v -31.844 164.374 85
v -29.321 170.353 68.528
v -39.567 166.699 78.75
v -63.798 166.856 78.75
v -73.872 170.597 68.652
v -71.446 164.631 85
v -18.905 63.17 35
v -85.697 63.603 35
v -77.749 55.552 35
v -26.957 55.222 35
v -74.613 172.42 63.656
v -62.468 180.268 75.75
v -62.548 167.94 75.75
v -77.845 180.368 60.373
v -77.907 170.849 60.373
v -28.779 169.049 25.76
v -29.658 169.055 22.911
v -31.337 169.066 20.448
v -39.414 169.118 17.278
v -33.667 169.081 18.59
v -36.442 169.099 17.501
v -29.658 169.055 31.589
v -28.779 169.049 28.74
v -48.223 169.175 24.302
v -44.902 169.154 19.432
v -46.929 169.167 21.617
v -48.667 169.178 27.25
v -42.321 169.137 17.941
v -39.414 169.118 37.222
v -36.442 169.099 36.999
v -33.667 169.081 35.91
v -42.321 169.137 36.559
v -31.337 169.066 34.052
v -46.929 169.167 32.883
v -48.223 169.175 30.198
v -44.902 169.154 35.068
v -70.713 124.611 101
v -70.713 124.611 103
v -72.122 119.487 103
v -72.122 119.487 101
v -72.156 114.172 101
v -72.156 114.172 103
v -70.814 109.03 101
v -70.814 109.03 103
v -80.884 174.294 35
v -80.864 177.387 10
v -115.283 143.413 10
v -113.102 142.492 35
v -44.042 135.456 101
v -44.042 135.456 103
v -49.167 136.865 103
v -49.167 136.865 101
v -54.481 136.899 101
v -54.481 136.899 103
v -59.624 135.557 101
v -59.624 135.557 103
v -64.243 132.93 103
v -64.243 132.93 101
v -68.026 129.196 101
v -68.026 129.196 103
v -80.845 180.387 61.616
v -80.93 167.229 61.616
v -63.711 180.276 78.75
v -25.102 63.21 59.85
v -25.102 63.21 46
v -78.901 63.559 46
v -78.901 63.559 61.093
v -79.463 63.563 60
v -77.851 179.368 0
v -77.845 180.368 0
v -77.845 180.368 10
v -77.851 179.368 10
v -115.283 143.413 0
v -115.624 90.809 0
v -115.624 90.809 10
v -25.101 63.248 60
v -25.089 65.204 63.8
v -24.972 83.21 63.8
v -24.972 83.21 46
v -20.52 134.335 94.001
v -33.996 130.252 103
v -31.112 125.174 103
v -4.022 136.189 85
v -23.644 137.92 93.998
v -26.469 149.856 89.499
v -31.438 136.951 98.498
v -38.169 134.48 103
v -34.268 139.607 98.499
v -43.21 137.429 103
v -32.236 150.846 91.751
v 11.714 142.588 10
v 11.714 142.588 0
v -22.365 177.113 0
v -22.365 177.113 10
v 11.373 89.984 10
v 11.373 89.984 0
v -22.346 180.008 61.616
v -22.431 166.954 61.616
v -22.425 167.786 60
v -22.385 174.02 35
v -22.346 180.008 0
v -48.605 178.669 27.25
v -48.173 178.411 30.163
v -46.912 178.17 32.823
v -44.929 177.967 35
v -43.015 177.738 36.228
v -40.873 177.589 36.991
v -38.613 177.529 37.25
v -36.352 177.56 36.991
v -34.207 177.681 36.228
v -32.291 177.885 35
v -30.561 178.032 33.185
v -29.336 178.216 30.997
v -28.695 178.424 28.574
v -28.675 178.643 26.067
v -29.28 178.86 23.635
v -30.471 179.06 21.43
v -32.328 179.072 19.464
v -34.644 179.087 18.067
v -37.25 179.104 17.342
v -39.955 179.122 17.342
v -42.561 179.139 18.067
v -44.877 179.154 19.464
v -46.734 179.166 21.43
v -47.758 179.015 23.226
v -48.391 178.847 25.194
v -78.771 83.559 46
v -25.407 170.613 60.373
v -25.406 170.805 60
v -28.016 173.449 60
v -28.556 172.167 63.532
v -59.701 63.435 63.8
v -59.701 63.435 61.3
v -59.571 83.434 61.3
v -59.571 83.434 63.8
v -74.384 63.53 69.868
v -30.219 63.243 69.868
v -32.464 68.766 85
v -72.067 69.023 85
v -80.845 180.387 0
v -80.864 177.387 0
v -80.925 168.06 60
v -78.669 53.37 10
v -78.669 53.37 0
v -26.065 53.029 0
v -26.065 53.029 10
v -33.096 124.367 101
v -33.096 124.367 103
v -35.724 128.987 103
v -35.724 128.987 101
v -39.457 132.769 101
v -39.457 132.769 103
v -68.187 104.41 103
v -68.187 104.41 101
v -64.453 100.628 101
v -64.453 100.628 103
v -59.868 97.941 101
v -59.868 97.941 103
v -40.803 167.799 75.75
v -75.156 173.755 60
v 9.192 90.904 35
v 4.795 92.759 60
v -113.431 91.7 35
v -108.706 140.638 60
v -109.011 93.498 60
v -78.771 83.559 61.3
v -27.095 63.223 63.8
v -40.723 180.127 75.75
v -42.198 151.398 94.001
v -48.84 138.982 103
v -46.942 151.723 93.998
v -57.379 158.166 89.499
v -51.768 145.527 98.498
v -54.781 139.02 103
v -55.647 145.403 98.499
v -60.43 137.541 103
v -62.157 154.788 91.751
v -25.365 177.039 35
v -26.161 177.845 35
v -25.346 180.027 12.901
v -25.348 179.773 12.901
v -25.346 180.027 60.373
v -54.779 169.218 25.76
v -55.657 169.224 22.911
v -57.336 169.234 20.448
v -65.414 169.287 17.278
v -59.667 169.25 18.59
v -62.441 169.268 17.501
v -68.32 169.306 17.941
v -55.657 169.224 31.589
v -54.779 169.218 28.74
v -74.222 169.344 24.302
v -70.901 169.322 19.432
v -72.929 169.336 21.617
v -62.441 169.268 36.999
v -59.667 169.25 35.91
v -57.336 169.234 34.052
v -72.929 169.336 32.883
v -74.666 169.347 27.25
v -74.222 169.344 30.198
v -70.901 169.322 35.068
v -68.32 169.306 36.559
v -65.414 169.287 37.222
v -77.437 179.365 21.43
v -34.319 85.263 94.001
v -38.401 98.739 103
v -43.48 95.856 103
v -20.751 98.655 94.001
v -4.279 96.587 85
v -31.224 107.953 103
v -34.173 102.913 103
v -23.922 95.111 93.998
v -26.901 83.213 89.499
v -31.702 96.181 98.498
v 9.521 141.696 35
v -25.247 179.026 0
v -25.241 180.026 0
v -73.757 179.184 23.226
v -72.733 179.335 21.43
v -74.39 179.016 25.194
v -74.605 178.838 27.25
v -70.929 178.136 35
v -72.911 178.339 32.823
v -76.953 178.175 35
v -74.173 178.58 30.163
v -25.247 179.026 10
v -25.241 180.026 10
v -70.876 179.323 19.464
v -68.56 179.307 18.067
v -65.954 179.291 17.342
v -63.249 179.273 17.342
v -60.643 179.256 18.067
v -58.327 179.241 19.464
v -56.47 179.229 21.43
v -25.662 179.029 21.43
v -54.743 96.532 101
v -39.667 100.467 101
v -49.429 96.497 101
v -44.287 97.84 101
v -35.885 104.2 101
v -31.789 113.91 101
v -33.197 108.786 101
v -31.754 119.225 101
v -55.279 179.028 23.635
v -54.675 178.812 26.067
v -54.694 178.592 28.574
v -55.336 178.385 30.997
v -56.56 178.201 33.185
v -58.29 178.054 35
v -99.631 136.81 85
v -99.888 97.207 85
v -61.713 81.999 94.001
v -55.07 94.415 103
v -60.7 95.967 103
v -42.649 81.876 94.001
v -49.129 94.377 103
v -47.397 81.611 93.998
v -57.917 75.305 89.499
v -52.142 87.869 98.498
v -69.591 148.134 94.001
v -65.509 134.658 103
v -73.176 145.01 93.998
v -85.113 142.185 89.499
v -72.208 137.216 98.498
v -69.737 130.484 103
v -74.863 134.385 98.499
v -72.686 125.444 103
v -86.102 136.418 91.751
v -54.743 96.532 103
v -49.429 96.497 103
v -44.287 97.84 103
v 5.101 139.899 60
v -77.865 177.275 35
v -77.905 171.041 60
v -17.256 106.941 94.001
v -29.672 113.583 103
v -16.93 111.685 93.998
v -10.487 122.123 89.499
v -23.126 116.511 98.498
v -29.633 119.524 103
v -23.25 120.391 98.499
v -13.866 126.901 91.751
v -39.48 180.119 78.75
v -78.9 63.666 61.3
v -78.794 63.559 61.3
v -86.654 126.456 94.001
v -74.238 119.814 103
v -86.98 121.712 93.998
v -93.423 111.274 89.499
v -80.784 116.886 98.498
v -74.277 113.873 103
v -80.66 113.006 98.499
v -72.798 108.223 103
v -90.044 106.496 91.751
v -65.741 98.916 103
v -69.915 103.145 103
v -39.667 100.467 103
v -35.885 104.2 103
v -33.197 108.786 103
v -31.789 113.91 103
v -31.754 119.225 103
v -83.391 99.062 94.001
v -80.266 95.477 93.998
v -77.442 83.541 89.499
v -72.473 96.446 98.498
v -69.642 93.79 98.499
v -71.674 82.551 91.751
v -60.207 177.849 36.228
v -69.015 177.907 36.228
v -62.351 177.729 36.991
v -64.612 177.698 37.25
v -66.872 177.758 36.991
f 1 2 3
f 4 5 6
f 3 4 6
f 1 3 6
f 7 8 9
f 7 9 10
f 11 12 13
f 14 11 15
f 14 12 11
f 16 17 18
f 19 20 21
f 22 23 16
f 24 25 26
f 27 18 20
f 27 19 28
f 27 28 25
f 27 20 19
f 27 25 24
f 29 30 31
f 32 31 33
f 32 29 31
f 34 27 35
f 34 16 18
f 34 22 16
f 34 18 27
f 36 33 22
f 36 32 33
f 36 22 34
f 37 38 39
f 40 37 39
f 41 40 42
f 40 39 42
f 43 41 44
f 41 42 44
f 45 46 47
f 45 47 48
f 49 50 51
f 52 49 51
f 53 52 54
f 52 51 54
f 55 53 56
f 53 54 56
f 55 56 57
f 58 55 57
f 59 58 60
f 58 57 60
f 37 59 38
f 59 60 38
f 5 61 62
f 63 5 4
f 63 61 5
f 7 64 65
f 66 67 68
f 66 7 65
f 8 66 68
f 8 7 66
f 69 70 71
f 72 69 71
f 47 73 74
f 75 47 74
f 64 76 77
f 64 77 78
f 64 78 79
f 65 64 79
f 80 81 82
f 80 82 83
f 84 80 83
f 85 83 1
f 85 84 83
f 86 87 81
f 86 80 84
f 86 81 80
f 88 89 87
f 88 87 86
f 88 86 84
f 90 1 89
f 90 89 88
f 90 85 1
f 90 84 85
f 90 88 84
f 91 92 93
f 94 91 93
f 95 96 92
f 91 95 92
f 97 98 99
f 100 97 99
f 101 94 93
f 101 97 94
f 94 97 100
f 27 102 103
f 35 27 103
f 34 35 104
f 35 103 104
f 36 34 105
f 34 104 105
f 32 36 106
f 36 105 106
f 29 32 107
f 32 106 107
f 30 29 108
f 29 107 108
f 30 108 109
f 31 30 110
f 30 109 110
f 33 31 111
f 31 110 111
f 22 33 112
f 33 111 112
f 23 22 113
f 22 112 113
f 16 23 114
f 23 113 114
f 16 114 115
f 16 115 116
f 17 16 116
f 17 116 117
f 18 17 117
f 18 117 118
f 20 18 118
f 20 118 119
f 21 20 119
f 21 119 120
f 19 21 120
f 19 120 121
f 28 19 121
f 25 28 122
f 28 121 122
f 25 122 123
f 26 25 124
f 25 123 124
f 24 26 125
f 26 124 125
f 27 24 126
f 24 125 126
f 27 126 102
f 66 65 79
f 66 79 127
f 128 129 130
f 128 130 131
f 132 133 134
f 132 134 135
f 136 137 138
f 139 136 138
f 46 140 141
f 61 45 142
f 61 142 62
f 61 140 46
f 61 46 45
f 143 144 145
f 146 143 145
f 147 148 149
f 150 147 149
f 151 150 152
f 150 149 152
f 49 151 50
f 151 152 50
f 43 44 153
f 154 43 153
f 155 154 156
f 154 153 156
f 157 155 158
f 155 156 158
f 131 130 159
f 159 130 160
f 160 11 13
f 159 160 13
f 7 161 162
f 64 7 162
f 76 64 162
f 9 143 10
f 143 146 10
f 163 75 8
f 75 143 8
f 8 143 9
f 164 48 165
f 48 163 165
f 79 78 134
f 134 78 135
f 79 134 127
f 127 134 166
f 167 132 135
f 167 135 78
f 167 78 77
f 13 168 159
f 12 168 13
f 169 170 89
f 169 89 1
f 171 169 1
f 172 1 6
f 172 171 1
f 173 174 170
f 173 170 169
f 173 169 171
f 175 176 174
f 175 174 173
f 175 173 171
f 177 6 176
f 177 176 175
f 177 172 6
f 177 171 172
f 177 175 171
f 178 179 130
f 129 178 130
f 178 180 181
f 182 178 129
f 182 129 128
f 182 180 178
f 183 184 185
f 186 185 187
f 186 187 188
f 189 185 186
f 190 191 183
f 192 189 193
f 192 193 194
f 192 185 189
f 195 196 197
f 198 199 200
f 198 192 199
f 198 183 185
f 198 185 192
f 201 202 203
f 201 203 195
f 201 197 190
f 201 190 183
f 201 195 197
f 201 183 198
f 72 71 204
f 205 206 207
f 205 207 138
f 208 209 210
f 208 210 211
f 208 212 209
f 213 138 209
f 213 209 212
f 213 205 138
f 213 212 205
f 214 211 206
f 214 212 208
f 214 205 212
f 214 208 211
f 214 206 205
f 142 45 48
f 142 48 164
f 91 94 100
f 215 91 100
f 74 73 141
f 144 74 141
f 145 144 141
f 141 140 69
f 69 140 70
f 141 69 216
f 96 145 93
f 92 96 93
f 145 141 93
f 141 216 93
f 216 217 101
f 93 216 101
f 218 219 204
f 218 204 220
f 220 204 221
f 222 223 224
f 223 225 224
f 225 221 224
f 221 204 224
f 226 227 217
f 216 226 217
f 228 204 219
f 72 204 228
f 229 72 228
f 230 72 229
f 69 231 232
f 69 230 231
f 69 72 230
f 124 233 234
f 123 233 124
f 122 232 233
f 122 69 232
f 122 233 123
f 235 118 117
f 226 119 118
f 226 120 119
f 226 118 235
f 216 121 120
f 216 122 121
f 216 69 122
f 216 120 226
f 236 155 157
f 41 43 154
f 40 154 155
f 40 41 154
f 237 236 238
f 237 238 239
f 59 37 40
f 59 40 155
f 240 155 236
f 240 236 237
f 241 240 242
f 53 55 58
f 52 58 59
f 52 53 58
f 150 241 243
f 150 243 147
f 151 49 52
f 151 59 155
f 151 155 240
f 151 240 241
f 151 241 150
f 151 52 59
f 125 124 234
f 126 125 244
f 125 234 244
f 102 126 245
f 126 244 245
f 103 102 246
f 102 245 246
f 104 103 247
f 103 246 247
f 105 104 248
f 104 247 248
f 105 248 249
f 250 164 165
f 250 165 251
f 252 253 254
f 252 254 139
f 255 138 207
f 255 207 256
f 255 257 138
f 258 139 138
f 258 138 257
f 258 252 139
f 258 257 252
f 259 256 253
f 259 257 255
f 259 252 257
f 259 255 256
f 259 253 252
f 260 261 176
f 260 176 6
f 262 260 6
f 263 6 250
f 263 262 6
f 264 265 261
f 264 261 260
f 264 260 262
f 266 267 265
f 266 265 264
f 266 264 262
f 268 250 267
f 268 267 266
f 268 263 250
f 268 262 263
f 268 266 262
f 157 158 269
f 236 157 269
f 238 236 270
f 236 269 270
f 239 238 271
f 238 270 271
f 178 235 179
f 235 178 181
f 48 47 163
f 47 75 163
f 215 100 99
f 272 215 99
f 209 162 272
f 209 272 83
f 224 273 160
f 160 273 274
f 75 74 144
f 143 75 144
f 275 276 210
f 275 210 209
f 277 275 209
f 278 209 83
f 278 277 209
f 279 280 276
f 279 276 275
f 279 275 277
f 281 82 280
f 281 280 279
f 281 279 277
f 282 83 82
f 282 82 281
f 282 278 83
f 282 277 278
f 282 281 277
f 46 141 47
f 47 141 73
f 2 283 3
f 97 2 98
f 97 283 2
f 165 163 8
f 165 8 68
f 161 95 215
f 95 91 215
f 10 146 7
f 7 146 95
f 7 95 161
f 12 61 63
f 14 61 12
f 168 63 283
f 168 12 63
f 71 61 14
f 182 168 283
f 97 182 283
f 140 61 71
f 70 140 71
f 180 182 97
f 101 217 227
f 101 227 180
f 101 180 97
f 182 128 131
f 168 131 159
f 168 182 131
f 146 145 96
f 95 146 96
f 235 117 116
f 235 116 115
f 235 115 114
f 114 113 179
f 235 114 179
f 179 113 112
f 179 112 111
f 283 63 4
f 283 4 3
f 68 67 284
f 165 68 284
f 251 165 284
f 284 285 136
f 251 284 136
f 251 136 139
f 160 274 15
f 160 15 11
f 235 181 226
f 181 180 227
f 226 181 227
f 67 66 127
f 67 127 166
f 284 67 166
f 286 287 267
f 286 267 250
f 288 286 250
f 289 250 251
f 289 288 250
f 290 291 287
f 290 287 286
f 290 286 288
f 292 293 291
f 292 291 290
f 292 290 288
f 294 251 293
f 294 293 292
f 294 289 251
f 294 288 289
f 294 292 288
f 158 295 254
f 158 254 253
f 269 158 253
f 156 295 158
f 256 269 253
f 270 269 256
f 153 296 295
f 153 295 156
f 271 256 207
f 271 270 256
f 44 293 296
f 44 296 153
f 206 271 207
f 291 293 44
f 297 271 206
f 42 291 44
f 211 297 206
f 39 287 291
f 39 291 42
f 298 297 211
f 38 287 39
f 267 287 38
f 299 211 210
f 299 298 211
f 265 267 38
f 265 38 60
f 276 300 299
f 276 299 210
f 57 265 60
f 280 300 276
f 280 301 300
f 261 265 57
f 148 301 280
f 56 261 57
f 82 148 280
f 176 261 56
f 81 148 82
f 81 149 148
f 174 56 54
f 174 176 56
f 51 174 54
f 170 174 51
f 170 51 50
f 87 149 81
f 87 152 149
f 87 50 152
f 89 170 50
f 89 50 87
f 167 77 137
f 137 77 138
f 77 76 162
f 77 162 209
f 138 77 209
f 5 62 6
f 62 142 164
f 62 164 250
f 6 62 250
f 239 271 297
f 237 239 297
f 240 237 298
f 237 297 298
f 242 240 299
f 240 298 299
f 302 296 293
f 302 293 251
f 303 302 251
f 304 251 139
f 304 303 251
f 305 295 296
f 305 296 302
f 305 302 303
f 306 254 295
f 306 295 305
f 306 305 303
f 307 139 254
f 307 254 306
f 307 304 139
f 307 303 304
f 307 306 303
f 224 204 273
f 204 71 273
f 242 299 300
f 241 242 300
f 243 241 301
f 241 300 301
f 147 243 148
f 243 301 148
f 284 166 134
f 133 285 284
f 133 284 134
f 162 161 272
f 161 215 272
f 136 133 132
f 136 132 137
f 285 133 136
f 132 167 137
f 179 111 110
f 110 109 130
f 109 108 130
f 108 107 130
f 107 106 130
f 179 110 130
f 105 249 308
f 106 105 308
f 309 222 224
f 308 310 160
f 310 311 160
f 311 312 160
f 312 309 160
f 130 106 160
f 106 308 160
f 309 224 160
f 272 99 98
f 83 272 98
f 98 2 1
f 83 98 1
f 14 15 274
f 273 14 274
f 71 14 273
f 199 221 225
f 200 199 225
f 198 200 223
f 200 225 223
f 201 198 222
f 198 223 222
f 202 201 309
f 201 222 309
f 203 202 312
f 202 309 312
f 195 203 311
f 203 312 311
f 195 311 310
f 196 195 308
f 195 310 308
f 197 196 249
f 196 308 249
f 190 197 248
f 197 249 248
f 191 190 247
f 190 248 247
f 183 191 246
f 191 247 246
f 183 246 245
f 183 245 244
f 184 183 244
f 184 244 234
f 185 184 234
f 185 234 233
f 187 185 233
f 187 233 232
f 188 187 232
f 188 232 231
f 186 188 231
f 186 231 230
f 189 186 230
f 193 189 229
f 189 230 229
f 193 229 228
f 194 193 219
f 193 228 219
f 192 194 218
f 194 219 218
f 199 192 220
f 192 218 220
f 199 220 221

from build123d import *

# Parameters (mm, degrees)
RESSALTO_EXTRUS_O1_DEPTH  = 10
RESSALTO_EXTRUS_O2_DEPTH  = 25
RESSALTO_EXTRUS_O2_TAPER  = 5
RESSALTO_EXTRUS_O3_DEPTH  = 25
RESSALTO_EXTRUS_O3_TAPER  = 10
RESSALTO_EXTRUS_O4_DEPTH  = 25
RESSALTO_EXTRUS_O4_TAPER  = 20
ESBO_O8_R                 = 5
RESSALTO_EXTRUS_O6_DEPTH  = 18
CORTE_EXTRUS_O2_DEPTH     = 2
RESSALTO_EXTRUS_O10_DEPTH = 50
CORTE_EXTRUS_O5_START     = 35
CORTE_EXTRUS_O5_DEPTH     = 50
CORTE_EXTRUS_O6_DEPTH     = 20
CORTE_EXTRUS_O7_DEPTH     = 1
ESBO_O17_R                = 10
CORTE_EXTRUS_O8_DEPTH     = 10


with BuildPart() as part:
    # Esboço1 → Ressalto-extrusão1 (new body)
    with BuildSketch(Plane.XY):
        Polygon((11.714282715, 142.58825066), (-25.240942572, 180.026335933), (-77.844956945, 180.367769505), (-115.283042218, 143.412544218), (-115.624475789, 90.808529845), (-78.669250503, 53.370444572), (-26.06523613, 53.029011), (11.372849143, 89.984236287), align=None)
    extrude(amount=RESSALTO_EXTRUS_O1_DEPTH)

    # Esboço3 → Ressalto-extrusão2 (add)
    with BuildSketch(Plane.XY.offset(10)):
        Polygon((11.372849143, 89.984236287), (11.714282715, 142.58825066), (-25.240942572, 180.026335933), (-77.844956945, 180.367769505), (-115.283042218, 143.412544218), (-115.624475789, 90.808529845), (-78.669250503, 53.370444572), (-26.06523613, 53.029011), align=None)
    extrude(amount=RESSALTO_EXTRUS_O2_DEPTH, taper=RESSALTO_EXTRUS_O2_TAPER)

    # Esboço4 → Ressalto-extrusão3 (add)
    with BuildSketch(Plane.XY.offset(35)):
        Polygon((-26.956995692, 55.222061748), (9.191558856, 90.904388109), (9.521231967, 141.696491098), (-26.161094394, 177.845045645), (-76.953197383, 178.174718757), (-113.10175193, 142.492392396), (-113.431425042, 91.700289407), (-77.749098681, 55.55173486), align=None)
    extrude(amount=RESSALTO_EXTRUS_O3_DEPTH, taper=RESSALTO_EXTRUS_O3_TAPER)

    # Esboço5 → Ressalto-extrusão4 (add)
    with BuildSketch(Plane.XY.offset(60)):
        Polygon((-75.894600212, 59.947965354), (-28.754271643, 59.641994585), (4.795328361, 92.758886578), (5.10129913, 139.899215147), (-28.015592863, 173.448815151), (-75.155921432, 173.75478592), (-108.705521436, 140.637893927), (-109.011492205, 93.497565358), align=None)
    extrude(amount=RESSALTO_EXTRUS_O4_DEPTH, taper=RESSALTO_EXTRUS_O4_TAPER)

    # Esboço8 → Ressalto-extrusão6 (add)
    with BuildSketch(Plane.XY.offset(85)):
        with Locations((-51.955096537, 116.698390253)):
            Circle(ESBO_O8_R)
    extrude(amount=RESSALTO_EXTRUS_O6_DEPTH)

    # Esboço6 → Loft1 section 0
    with BuildSketch(Plane.XY.offset(85)):
        with BuildLine():
            Line((-99.887965086, 97.207462428), (-72.066585693, 69.022566624))
            Line((-72.066585693, 69.022566624), (-32.464168713, 68.765521704))
            Line((-32.464168713, 68.765521704), (-4.279272909, 96.586901097))
            Line((-4.279272909, 96.586901097), (-4.022227989, 136.189318077))
            Line((-4.022227989, 136.189318077), (-31.843607381, 164.374213881))
            Line((-31.843607381, 164.374213881), (-71.446024362, 164.631258801))
            Line((-71.446024362, 164.631258801), (-99.630920166, 136.809879409))
            Line((-99.630920166, 136.809879409), (-99.887965086, 97.207462428))
        make_face()
    # Esboço7 for Loft1 → Loft1 section 1
    with BuildSketch(Plane.XY.offset(103)):
        with BuildLine():
            # circular arc as an exact rational Bezier (weights 1, cos(half-angle), 1)
            Bezier((-72.797833823, 108.223114301), (-69.28725958, 99.58976984), (-60.700212313, 95.967424282), weights=[1, 0.923879532, 1])
            Bezier((-60.700212313, 95.967424282), (-52.113165047, 92.345078724), (-43.479820586, 95.855652967), weights=[1, 0.923879533, 1])
            Bezier((-43.479820586, 95.855652967), (-34.846476125, 99.36622721), (-31.224130567, 107.953274477), weights=[1, 0.923879532, 1])
            Bezier((-31.224130567, 107.953274477), (-27.601785009, 116.540321743), (-31.112359252, 125.173666204), weights=[1, 0.923879533, 1])
            Bezier((-31.112359252, 125.173666204), (-34.622933495, 133.807010665), (-43.209980762, 137.429356223), weights=[1, 0.923879532, 1])
            Bezier((-43.209980762, 137.429356223), (-51.797028028, 141.051701781), (-60.430372489, 137.541127538), weights=[1, 0.923879533, 1])
            Bezier((-60.430372489, 137.541127538), (-69.06371695, 134.030553295), (-72.686062508, 125.443506028), weights=[1, 0.923879532, 1])
            Bezier((-72.686062508, 125.443506028), (-76.308408066, 116.856458762), (-72.797833823, 108.223114301), weights=[1, 0.923879533, 1])
        make_face()
    loft()

    # Esboço9 → Corte-extrusão2 (cut)
    with BuildSketch(Plane.XY.offset(103)):
        with BuildLine():
            ThreePointArc((-44.042402012, 135.456037969), (-51.822961029, 137.056254156), (-59.62363648, 135.557170109))
            ThreePointArc((-59.62363648, 135.557170109), (-66.25684624, 131.187007783), (-70.712744254, 124.611084778))
            ThreePointArc((-70.712744254, 124.611084778), (-72.312960441, 116.830525761), (-70.813876394, 109.02985031))
            ThreePointArc((-70.813876394, 109.02985031), (-66.443714068, 102.39664055), (-59.867791063, 97.940742536))
            ThreePointArc((-59.867791063, 97.940742536), (-52.087232046, 96.340526349), (-44.286556595, 97.839610396))
            ThreePointArc((-44.286556595, 97.839610396), (-37.653346835, 102.209772722), (-33.197448821, 108.785695727))
            ThreePointArc((-33.197448821, 108.785695727), (-31.597232634, 116.566254744), (-33.096316681, 124.366930195))
            ThreePointArc((-33.096316681, 124.366930195), (-37.466479007, 131.000139955), (-44.042402012, 135.456037969))
        make_face()
    extrude(amount=-CORTE_EXTRUS_O2_DEPTH, mode=Mode.SUBTRACT)

    # Esboço13 → Corte-extrusão5 (cut)
    with BuildSketch(Plane.XY.offset(CORTE_EXTRUS_O5_START)):
        Polygon((-98.070713952, 55.683635091), (-5.651465, 55.083775278), (-7.425428207, 63.095457942), (-96.192902738, 63.671615412), align=None)
    extrude(amount=CORTE_EXTRUS_O5_DEPTH, mode=Mode.SUBTRACT)

    # Esboço15 → Corte-extrusão6 (cut)
    with BuildSketch(Plane(origin=(0.409199665, 63.044606215, 0), x_dir=(0.9999789364800716, -0.006490500457210974, 0), z_dir=(-0.006490500457210974, -0.9999789364800716, 0))):
        Polygon((-79.311433136, 61.3), (-60.111433136, 61.3), (-60.111433136, 63.8), (-25.511433136, 63.8), (-25.511433136, 46), (-79.311433136, 46), align=None)
    extrude(amount=-CORTE_EXTRUS_O6_DEPTH, mode=Mode.SUBTRACT)


with BuildPart() as body_2:
    # Esboço12 → Ressalto-extrusão10 (new body)
    with BuildSketch(Plane(origin=(1.167373089, 179.854929138, 0), x_dir=(0.9999789364800716, -0.0064905004572113805, 0), z_dir=(0.0064905004572113805, 0.9999789364800716, 0))):
        Polygon((-79.013994346, 0), (-82.013994346, 0), (-82.013994346, -61.615746699), (-64.879741046, -78.75), (-40.648247647, -78.75), (-23.513994346, -61.615746699), (-23.513994346, 0), (-26.408871925, 0), (-26.408871925, -10), (-26.513994346, -10), (-26.513994346, -60.373106012), (-41.890888334, -75.75), (-63.637100359, -75.75), (-79.013994346, -60.373106012), (-79.013994346, -10), align=None)
    extrude(amount=-RESSALTO_EXTRUS_O10_DEPTH)


with BuildPart() as corte_extrus_o7_tool:
    # Esboço16 → Corte-extrusão7 (new body)
    with BuildSketch(Plane(origin=(1.167373089, 179.854929138, 0), x_dir=(0.9999789364800716, -0.0064905004572113805, 0), z_dir=(0.0064905004572113805, 0.9999789364800716, 0))):
        Polygon((-26.408871925, 0), (-79.013994346, 0), (-79.013994346, -10), (-78.108019572, -35), (-27.314846699, -35), (-26.408871925, -10), align=None)
    extrude(amount=-CORTE_EXTRUS_O7_DEPTH)


with BuildPart() as part_1:
    add(part.part)

    # Corte-extrusão7: cut by corte_extrus_o7_tool
    add(corte_extrus_o7_tool.part, mode=Mode.SUBTRACT)

    # Esboço17 → Corte-extrusão8 (cut)
    with BuildSketch(Plane(origin=(1.160882588, 178.854950202, 0), x_dir=(0.9999789364800716, -0.0064905004572113805, 0), z_dir=(0.0064905004572113805, 0.9999789364800716, 0))):
        with Locations(Location((-39.763994346, -27.25, 0), (0, 0, 180))):
            Circle(ESBO_O17_R)
        with Locations(Location((-65.763994346, -27.25, 0), (0, 0, 180))):
            Circle(ESBO_O17_R)
    extrude(amount=-CORTE_EXTRUS_O8_DEPTH, mode=Mode.SUBTRACT)


with BuildPart() as body_2_1:
    add(body_2.part)

    # Corte-extrusão7: cut by corte_extrus_o7_tool
    add(corte_extrus_o7_tool.part, mode=Mode.SUBTRACT)


with BuildPart() as part_2:
    add(part_1.part)

    # Combinar1: union body 2
    add(body_2_1.part)


solid = part_2.part
